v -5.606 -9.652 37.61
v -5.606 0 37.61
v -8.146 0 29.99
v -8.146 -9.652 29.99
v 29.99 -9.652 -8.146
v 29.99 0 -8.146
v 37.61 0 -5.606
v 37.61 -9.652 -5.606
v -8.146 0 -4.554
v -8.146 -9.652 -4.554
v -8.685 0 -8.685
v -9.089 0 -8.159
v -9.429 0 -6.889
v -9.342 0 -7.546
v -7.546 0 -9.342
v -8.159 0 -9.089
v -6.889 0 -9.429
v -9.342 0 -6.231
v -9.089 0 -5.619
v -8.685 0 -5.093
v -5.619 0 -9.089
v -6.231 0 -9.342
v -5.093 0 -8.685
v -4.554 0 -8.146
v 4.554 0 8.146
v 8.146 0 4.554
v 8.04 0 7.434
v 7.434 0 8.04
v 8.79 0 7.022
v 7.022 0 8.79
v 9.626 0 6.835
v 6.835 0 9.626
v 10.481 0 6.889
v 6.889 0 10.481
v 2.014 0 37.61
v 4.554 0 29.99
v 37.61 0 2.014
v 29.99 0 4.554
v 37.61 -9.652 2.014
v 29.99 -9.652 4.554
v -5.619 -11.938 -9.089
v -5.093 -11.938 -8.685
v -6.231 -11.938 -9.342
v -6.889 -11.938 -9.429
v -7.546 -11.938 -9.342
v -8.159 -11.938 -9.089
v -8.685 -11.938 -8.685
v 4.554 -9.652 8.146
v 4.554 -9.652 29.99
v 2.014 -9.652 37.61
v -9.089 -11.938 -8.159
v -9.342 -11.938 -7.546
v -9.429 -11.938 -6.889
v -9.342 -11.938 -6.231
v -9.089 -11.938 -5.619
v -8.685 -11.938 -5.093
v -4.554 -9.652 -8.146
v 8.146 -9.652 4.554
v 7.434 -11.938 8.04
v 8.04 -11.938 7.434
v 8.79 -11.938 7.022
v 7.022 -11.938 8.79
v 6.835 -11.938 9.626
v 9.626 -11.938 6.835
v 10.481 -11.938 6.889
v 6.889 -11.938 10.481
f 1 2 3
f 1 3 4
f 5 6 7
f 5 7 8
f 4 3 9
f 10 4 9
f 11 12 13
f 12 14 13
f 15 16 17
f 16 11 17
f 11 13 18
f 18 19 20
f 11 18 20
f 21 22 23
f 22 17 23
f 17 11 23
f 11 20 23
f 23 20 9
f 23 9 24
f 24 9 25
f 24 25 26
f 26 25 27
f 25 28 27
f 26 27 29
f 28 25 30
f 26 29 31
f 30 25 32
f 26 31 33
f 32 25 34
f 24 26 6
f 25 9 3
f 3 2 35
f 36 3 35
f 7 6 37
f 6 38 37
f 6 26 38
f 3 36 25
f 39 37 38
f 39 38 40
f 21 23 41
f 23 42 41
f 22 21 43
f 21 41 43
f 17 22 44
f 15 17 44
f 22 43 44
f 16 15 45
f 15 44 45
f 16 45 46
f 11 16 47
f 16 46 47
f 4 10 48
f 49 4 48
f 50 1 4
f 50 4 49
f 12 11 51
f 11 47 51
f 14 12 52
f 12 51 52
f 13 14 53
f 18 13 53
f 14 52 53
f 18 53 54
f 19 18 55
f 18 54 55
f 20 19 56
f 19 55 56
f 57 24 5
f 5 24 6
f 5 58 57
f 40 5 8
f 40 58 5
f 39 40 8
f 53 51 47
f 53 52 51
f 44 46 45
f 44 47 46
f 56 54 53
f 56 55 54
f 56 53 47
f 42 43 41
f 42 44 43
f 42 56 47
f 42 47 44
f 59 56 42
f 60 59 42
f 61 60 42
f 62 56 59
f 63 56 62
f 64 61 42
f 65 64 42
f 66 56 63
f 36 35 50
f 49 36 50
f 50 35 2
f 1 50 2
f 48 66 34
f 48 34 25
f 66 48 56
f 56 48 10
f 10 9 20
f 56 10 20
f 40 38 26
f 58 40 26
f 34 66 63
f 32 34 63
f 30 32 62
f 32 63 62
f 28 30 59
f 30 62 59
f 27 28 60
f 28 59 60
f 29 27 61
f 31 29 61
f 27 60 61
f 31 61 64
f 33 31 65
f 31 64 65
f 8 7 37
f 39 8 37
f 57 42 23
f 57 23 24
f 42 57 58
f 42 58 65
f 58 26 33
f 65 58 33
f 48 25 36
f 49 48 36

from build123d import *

# Parameters (mm, degrees)
F1_DEPTH   = 11.938
F2_DEPTH   = 9.652
F3_SIZE2   = 2.54
F3_SIZE    = 7.62
F3_2_SIZE2 = 2.54
F3_2_SIZE  = 7.62
F3_3_SIZE2 = 2.54
F3_3_SIZE  = 7.62
F4_SIZE2   = 7.62
F4_SIZE    = 2.54
F5_R       = 2.53999
F6_R       = 3.0383713325
F7_DEPTH   = 25.4


# Not quite as in the source:
# - a fillet or chamfer is up to 0.001 mm smaller than in the source, because OpenCascade refuses the exact size


with BuildPart() as f1:
    # F0 (on Front) → F1 (new body)
    with BuildSketch(Plane.XZ):
        Polygon((-6.8888153673, -10.4809178157), (-4.5539487758, -8.1460512242), (8.1460512242, 4.5539487758), (10.4809178157, 6.8888153673), (6.8888153673, 10.4809178157), (4.5539487758, 8.1460512242), (-8.1460512242, -4.5539487758), (-10.4809178157, -6.8888153673), align=None)
    extrude(amount=F1_DEPTH)

    # F0 (on Front) → F2 (join)
    with BuildSketch(Plane.XZ):
        Polygon((-8.1460512242, 37.6100512242), (-8.1460512242, -4.5539487758), (4.5539487758, 8.1460512242), (4.5539487758, 37.6100512242), (0, 37.6100512242), align=None)
        Polygon((8.1460512242, 4.5539487758), (-4.5539487758, -8.1460512242), (37.6100512242, -8.1460512242), (37.6100512242, 0), (37.6100512242, 4.5539487758), align=None)
    extrude(amount=F2_DEPTH)

    # F3
    f3_edges = [f1.edges().sort_by_distance(p)[0] for p in [
        (-8.146051, -4.826, 37.610051),
    ]]
    f3_side = f1.faces().sort_by_distance((-8.146051, -4.826, 16.528051))[0]
    chamfer(f3_edges, length=F3_SIZE, length2=F3_SIZE2, reference=f3_side)

    # F3#2
    f3_2_edges = [f1.edges().sort_by_distance(p)[0] for p in [
        (4.553949, -4.826, 37.610051),
    ]]
    f3_2_side = f1.faces().sort_by_distance((4.553949, -4.826, 22.878051))[0]
    chamfer(f3_2_edges, length=F3_2_SIZE, length2=F3_2_SIZE2, reference=f3_2_side)

    # F3#3
    f3_3_edges = [f1.edges().sort_by_distance(p)[0] for p in [
        (37.610051, -4.826, 4.553949),
    ]]
    f3_3_side = f1.faces().sort_by_distance((22.878051, -4.826, 4.553949))[0]
    chamfer(f3_3_edges, length=F3_3_SIZE, length2=F3_3_SIZE2, reference=f3_3_side)

    # F4
    f4_edges = [f1.edges().sort_by_distance(p)[0] for p in [
        (37.610051, -4.826, -8.146051),
    ]]
    f4_side = f1.faces().sort_by_distance((37.610051, -4.826, -3.066051))[0]
    chamfer(f4_edges, length=F4_SIZE, length2=F4_SIZE2, reference=f4_side)

    # F5 (radius 2.54 in the source; OpenCascade refuses exactly that, so slightly less here)
    f5_edges = [f1.edges().sort_by_distance(p)[0] for p in [
        (-10.480918, -5.969, -6.888815),
        (-6.888815, -5.969, -10.480918),
    ]]
    fillet(f5_edges, radius=F5_R)

    # F6 (on face) → F7 (cut)
    with BuildSketch(Plane.XZ.offset(11.938)):
        with Locations((9.8638704833, 9.8638704833)):
            Circle(F6_R)
    extrude(amount=-F7_DEPTH, mode=Mode.SUBTRACT)


solid = f1.part
